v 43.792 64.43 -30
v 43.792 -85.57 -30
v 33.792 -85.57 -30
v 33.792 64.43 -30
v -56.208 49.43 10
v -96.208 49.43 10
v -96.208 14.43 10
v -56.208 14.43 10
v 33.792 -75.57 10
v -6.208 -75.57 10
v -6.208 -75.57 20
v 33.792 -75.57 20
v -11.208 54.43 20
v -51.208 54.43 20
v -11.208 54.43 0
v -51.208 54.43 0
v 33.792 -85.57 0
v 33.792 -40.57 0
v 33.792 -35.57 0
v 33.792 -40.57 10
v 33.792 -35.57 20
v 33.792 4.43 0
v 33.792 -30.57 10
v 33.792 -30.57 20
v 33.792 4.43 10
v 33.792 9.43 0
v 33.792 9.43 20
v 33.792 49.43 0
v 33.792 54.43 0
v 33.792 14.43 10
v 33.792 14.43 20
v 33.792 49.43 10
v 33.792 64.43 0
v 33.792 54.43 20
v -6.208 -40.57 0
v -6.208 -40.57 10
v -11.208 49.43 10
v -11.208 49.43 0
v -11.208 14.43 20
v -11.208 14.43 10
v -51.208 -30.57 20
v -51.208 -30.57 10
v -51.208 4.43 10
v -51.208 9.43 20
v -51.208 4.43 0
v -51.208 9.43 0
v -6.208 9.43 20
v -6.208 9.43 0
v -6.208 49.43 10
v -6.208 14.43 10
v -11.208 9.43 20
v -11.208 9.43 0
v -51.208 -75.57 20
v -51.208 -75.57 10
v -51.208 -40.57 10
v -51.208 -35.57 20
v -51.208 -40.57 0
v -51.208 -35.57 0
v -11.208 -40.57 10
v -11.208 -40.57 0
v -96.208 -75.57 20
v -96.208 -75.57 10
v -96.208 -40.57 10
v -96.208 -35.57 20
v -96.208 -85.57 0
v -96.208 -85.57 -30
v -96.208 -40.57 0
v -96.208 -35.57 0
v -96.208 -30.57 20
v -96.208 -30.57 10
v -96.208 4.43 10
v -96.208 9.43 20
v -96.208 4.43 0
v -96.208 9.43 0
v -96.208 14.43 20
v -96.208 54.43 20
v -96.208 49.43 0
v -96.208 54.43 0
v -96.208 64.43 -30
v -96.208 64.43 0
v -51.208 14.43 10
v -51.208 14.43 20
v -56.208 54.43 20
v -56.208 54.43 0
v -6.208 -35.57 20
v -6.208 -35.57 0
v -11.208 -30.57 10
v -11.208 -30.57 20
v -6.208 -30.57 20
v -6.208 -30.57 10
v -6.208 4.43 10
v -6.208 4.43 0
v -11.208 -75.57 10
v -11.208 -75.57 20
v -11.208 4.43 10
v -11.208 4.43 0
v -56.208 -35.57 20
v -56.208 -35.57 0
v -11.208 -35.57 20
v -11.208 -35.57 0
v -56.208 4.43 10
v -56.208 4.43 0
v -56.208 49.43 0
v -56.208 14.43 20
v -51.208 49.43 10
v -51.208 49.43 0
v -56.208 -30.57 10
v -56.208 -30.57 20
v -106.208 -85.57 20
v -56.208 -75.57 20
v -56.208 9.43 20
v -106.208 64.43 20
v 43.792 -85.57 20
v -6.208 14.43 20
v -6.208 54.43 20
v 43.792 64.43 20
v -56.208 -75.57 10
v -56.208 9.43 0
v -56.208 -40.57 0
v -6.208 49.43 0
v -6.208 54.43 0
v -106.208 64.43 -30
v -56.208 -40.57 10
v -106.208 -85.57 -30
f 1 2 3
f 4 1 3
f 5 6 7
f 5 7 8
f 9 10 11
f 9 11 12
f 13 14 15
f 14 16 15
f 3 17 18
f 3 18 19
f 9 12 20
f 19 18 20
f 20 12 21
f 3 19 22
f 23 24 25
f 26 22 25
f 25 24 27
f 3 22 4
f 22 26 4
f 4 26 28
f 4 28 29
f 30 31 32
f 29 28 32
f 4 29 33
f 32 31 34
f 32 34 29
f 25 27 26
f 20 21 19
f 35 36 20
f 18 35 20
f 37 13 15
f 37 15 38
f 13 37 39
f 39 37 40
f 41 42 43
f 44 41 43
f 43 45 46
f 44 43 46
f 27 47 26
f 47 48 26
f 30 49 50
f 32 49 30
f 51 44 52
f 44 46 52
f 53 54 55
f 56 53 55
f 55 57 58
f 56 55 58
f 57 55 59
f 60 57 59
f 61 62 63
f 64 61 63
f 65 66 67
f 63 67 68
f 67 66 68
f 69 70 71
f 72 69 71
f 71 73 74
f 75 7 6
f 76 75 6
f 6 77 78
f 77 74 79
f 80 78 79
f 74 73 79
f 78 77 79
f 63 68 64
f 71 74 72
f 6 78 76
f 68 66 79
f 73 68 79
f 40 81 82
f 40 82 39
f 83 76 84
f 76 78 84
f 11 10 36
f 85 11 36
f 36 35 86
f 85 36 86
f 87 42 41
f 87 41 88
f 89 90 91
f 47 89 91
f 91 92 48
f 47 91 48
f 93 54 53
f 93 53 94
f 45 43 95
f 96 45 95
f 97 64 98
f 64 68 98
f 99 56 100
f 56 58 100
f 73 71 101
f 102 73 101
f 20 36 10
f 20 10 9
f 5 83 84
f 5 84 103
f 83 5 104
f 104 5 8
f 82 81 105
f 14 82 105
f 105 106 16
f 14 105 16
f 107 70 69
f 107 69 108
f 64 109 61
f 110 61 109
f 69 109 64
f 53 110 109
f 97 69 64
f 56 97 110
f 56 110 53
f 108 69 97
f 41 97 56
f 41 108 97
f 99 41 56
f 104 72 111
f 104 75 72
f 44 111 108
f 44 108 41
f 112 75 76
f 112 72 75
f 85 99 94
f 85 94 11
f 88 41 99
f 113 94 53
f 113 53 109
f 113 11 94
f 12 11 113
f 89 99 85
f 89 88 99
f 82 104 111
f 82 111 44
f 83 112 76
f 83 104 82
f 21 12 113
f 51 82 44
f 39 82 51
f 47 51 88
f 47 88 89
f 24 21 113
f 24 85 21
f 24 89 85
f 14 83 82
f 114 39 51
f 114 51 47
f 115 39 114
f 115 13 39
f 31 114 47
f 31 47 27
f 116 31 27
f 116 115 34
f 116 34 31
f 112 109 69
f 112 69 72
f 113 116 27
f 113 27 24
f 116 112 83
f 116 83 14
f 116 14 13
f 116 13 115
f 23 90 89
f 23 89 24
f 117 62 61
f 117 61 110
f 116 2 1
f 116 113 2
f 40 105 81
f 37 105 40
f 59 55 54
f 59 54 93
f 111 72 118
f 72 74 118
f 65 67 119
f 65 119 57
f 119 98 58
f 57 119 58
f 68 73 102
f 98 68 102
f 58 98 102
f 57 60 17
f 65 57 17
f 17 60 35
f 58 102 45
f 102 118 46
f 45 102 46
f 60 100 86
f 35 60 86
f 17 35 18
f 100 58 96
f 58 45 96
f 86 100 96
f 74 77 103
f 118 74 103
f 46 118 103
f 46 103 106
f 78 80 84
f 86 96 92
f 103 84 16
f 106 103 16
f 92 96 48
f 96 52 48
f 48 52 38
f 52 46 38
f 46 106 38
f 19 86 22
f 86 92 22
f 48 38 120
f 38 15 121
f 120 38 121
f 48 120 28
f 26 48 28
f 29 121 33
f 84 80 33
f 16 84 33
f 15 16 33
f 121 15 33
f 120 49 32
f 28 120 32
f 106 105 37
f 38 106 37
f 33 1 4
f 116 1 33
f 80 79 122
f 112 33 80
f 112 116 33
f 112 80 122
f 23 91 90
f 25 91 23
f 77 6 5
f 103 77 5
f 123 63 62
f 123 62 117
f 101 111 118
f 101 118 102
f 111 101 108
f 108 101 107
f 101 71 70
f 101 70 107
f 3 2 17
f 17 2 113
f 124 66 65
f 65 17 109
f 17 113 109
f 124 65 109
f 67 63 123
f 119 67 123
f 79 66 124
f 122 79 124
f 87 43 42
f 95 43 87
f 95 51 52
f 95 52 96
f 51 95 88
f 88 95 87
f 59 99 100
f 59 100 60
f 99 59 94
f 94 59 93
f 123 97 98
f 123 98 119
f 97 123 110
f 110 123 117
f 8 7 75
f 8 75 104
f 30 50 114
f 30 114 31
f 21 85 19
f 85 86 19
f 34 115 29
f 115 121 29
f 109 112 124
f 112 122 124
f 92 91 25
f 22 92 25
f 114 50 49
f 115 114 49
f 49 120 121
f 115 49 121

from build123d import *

# Parameters (mm, degrees)
SKETCH1_W           = 150
SKETCH1_H           = 150
BOSS_EXTRUDE1_DEPTH = 10
SKETCH2_W           = 40
SKETCH2_H           = 5
SKETCH2_H_2         = 10
BOSS_EXTRUDE2_DEPTH = 10
SKETCH3_W           = 40
SKETCH3_H           = 5
CUT_EXTRUDE1_DEPTH  = 10
SKETCH4_W           = 10
SKETCH4_H           = 150
BOSS_EXTRUDE3_DEPTH = 30


with BuildPart() as part:
    # Sketch1 → Boss-Extrude1 (new body)
    with BuildSketch(Plane.XY):
        with Locations((-31.208053691, -10.570469799)):
            Rectangle(SKETCH1_W, SKETCH1_H)
    extrude(amount=BOSS_EXTRUDE1_DEPTH)

    # Sketch2 → Boss-Extrude2 (add)
    with BuildSketch(Plane.XY.offset(10)):
        Polygon((-96.208053691, 64.429530201), (-106.208053691, 64.429530201), (-106.208053691, -85.570469799), (-96.208053691, -85.570469799), (-96.208053691, -75.570469799), (-96.208053691, -35.570469799), (-96.208053691, -30.570469799), (-96.208053691, 9.429530201), (-96.208053691, 14.429530201), (-96.208053691, 54.429530201), align=None)
        with Locations((-76.208053691, 11.929530201)):
            Rectangle(SKETCH2_W, SKETCH2_H)
        Polygon((-51.208053691, 64.429530201), (-56.208053691, 64.429530201), (-56.208053691, 54.429530201), (-56.208053691, 14.429530201), (-56.208053691, 9.429530201), (-56.208053691, -30.570469799), (-56.208053691, -35.570469799), (-56.208053691, -75.570469799), (-56.208053691, -85.570469799), (-51.208053691, -85.570469799), (-51.208053691, -75.570469799), (-51.208053691, -35.570469799), (-51.208053691, -30.570469799), (-51.208053691, 9.429530201), (-51.208053691, 14.429530201), (-51.208053691, 54.429530201), align=None)
        with Locations((-76.208053691, 59.429530201)):
            Rectangle(SKETCH2_W, SKETCH2_H_2)
        with Locations((-31.208053691, 59.429530201)):
            Rectangle(SKETCH2_W, SKETCH2_H_2)
        Polygon((-6.208053691, 64.429530201), (-11.208053691, 64.429530201), (-11.208053691, 54.429530201), (-11.208053691, 14.429530201), (-11.208053691, 9.429530201), (-11.208053691, -30.570469799), (-11.208053691, -35.570469799), (-11.208053691, -75.570469799), (-11.208053691, -85.570469799), (-6.208053691, -85.570469799), (-6.208053691, -75.570469799), (-6.208053691, -35.570469799), (-6.208053691, -30.570469799), (-6.208053691, 9.429530201), (-6.208053691, 14.429530201), (-6.208053691, 54.429530201), align=None)
        with Locations((13.791946309, 59.429530201)):
            Rectangle(SKETCH2_W, SKETCH2_H_2)
        Polygon((43.791946309, 64.429530201), (33.791946309, 64.429530201), (33.791946309, 54.429530201), (33.791946309, 14.429530201), (33.791946309, 9.429530201), (33.791946309, -30.570469799), (33.791946309, -35.570469799), (33.791946309, -75.570469799), (33.791946309, -85.570469799), (43.791946309, -85.570469799), align=None)
        with Locations((-76.208053691, -80.570469799)):
            Rectangle(SKETCH2_W, SKETCH2_H_2)
        with Locations((13.791946309, -80.570469799)):
            Rectangle(SKETCH2_W, SKETCH2_H_2)
        with Locations((-31.208053691, -80.570469799)):
            Rectangle(SKETCH2_W, SKETCH2_H_2)
        with Locations((-31.208053691, 11.929530201)):
            Rectangle(SKETCH2_W, SKETCH2_H)
        with Locations((13.791946309, 11.929530201)):
            Rectangle(SKETCH2_W, SKETCH2_H)
        with Locations((13.791946309, -33.070469799)):
            Rectangle(SKETCH2_W, SKETCH2_H)
        with Locations((-76.208053691, -33.070469799)):
            Rectangle(SKETCH2_W, SKETCH2_H)
        with Locations((-31.208053691, -33.070469799)):
            Rectangle(SKETCH2_W, SKETCH2_H)
    extrude(amount=BOSS_EXTRUDE2_DEPTH)

    # Sketch3 → Cut-Extrude1 (cut)
    with BuildSketch(Plane.XY.offset(10)):
        with Locations((-76.208053691, 51.929530201)):
            Rectangle(SKETCH3_W, SKETCH3_H)
        with Locations((-31.208053691, 51.929530201)):
            Rectangle(SKETCH3_W, SKETCH3_H)
        with Locations((13.791946309, 51.929530201)):
            Rectangle(SKETCH3_W, SKETCH3_H)
        with Locations((-76.208053691, 6.929530201)):
            Rectangle(SKETCH3_W, SKETCH3_H)
        with Locations((-31.208053691, 6.929530201)):
            Rectangle(SKETCH3_W, SKETCH3_H)
        with Locations((13.791946309, 6.929530201)):
            Rectangle(SKETCH3_W, SKETCH3_H)
        with Locations((-76.208053691, -38.070469799)):
            Rectangle(SKETCH3_W, SKETCH3_H)
        with Locations((-31.208053691, -38.070469799)):
            Rectangle(SKETCH3_W, SKETCH3_H)
        with Locations((13.791946309, -38.070469799)):
            Rectangle(SKETCH3_W, SKETCH3_H)
    extrude(amount=-CUT_EXTRUDE1_DEPTH, mode=Mode.SUBTRACT)

    # Sketch4 → Boss-Extrude3 (add)
    with BuildSketch(Plane(origin=(0, 0, 0), x_dir=(-1, 0, 0), z_dir=(0, 0, -1))):
        with Locations((-38.791946309, -10.570469799)):
            Rectangle(SKETCH4_W, SKETCH4_H)
        with Locations((101.208053691, -10.570469799)):
            Rectangle(SKETCH4_W, SKETCH4_H)
    extrude(amount=BOSS_EXTRUDE3_DEPTH)


solid = part.part
